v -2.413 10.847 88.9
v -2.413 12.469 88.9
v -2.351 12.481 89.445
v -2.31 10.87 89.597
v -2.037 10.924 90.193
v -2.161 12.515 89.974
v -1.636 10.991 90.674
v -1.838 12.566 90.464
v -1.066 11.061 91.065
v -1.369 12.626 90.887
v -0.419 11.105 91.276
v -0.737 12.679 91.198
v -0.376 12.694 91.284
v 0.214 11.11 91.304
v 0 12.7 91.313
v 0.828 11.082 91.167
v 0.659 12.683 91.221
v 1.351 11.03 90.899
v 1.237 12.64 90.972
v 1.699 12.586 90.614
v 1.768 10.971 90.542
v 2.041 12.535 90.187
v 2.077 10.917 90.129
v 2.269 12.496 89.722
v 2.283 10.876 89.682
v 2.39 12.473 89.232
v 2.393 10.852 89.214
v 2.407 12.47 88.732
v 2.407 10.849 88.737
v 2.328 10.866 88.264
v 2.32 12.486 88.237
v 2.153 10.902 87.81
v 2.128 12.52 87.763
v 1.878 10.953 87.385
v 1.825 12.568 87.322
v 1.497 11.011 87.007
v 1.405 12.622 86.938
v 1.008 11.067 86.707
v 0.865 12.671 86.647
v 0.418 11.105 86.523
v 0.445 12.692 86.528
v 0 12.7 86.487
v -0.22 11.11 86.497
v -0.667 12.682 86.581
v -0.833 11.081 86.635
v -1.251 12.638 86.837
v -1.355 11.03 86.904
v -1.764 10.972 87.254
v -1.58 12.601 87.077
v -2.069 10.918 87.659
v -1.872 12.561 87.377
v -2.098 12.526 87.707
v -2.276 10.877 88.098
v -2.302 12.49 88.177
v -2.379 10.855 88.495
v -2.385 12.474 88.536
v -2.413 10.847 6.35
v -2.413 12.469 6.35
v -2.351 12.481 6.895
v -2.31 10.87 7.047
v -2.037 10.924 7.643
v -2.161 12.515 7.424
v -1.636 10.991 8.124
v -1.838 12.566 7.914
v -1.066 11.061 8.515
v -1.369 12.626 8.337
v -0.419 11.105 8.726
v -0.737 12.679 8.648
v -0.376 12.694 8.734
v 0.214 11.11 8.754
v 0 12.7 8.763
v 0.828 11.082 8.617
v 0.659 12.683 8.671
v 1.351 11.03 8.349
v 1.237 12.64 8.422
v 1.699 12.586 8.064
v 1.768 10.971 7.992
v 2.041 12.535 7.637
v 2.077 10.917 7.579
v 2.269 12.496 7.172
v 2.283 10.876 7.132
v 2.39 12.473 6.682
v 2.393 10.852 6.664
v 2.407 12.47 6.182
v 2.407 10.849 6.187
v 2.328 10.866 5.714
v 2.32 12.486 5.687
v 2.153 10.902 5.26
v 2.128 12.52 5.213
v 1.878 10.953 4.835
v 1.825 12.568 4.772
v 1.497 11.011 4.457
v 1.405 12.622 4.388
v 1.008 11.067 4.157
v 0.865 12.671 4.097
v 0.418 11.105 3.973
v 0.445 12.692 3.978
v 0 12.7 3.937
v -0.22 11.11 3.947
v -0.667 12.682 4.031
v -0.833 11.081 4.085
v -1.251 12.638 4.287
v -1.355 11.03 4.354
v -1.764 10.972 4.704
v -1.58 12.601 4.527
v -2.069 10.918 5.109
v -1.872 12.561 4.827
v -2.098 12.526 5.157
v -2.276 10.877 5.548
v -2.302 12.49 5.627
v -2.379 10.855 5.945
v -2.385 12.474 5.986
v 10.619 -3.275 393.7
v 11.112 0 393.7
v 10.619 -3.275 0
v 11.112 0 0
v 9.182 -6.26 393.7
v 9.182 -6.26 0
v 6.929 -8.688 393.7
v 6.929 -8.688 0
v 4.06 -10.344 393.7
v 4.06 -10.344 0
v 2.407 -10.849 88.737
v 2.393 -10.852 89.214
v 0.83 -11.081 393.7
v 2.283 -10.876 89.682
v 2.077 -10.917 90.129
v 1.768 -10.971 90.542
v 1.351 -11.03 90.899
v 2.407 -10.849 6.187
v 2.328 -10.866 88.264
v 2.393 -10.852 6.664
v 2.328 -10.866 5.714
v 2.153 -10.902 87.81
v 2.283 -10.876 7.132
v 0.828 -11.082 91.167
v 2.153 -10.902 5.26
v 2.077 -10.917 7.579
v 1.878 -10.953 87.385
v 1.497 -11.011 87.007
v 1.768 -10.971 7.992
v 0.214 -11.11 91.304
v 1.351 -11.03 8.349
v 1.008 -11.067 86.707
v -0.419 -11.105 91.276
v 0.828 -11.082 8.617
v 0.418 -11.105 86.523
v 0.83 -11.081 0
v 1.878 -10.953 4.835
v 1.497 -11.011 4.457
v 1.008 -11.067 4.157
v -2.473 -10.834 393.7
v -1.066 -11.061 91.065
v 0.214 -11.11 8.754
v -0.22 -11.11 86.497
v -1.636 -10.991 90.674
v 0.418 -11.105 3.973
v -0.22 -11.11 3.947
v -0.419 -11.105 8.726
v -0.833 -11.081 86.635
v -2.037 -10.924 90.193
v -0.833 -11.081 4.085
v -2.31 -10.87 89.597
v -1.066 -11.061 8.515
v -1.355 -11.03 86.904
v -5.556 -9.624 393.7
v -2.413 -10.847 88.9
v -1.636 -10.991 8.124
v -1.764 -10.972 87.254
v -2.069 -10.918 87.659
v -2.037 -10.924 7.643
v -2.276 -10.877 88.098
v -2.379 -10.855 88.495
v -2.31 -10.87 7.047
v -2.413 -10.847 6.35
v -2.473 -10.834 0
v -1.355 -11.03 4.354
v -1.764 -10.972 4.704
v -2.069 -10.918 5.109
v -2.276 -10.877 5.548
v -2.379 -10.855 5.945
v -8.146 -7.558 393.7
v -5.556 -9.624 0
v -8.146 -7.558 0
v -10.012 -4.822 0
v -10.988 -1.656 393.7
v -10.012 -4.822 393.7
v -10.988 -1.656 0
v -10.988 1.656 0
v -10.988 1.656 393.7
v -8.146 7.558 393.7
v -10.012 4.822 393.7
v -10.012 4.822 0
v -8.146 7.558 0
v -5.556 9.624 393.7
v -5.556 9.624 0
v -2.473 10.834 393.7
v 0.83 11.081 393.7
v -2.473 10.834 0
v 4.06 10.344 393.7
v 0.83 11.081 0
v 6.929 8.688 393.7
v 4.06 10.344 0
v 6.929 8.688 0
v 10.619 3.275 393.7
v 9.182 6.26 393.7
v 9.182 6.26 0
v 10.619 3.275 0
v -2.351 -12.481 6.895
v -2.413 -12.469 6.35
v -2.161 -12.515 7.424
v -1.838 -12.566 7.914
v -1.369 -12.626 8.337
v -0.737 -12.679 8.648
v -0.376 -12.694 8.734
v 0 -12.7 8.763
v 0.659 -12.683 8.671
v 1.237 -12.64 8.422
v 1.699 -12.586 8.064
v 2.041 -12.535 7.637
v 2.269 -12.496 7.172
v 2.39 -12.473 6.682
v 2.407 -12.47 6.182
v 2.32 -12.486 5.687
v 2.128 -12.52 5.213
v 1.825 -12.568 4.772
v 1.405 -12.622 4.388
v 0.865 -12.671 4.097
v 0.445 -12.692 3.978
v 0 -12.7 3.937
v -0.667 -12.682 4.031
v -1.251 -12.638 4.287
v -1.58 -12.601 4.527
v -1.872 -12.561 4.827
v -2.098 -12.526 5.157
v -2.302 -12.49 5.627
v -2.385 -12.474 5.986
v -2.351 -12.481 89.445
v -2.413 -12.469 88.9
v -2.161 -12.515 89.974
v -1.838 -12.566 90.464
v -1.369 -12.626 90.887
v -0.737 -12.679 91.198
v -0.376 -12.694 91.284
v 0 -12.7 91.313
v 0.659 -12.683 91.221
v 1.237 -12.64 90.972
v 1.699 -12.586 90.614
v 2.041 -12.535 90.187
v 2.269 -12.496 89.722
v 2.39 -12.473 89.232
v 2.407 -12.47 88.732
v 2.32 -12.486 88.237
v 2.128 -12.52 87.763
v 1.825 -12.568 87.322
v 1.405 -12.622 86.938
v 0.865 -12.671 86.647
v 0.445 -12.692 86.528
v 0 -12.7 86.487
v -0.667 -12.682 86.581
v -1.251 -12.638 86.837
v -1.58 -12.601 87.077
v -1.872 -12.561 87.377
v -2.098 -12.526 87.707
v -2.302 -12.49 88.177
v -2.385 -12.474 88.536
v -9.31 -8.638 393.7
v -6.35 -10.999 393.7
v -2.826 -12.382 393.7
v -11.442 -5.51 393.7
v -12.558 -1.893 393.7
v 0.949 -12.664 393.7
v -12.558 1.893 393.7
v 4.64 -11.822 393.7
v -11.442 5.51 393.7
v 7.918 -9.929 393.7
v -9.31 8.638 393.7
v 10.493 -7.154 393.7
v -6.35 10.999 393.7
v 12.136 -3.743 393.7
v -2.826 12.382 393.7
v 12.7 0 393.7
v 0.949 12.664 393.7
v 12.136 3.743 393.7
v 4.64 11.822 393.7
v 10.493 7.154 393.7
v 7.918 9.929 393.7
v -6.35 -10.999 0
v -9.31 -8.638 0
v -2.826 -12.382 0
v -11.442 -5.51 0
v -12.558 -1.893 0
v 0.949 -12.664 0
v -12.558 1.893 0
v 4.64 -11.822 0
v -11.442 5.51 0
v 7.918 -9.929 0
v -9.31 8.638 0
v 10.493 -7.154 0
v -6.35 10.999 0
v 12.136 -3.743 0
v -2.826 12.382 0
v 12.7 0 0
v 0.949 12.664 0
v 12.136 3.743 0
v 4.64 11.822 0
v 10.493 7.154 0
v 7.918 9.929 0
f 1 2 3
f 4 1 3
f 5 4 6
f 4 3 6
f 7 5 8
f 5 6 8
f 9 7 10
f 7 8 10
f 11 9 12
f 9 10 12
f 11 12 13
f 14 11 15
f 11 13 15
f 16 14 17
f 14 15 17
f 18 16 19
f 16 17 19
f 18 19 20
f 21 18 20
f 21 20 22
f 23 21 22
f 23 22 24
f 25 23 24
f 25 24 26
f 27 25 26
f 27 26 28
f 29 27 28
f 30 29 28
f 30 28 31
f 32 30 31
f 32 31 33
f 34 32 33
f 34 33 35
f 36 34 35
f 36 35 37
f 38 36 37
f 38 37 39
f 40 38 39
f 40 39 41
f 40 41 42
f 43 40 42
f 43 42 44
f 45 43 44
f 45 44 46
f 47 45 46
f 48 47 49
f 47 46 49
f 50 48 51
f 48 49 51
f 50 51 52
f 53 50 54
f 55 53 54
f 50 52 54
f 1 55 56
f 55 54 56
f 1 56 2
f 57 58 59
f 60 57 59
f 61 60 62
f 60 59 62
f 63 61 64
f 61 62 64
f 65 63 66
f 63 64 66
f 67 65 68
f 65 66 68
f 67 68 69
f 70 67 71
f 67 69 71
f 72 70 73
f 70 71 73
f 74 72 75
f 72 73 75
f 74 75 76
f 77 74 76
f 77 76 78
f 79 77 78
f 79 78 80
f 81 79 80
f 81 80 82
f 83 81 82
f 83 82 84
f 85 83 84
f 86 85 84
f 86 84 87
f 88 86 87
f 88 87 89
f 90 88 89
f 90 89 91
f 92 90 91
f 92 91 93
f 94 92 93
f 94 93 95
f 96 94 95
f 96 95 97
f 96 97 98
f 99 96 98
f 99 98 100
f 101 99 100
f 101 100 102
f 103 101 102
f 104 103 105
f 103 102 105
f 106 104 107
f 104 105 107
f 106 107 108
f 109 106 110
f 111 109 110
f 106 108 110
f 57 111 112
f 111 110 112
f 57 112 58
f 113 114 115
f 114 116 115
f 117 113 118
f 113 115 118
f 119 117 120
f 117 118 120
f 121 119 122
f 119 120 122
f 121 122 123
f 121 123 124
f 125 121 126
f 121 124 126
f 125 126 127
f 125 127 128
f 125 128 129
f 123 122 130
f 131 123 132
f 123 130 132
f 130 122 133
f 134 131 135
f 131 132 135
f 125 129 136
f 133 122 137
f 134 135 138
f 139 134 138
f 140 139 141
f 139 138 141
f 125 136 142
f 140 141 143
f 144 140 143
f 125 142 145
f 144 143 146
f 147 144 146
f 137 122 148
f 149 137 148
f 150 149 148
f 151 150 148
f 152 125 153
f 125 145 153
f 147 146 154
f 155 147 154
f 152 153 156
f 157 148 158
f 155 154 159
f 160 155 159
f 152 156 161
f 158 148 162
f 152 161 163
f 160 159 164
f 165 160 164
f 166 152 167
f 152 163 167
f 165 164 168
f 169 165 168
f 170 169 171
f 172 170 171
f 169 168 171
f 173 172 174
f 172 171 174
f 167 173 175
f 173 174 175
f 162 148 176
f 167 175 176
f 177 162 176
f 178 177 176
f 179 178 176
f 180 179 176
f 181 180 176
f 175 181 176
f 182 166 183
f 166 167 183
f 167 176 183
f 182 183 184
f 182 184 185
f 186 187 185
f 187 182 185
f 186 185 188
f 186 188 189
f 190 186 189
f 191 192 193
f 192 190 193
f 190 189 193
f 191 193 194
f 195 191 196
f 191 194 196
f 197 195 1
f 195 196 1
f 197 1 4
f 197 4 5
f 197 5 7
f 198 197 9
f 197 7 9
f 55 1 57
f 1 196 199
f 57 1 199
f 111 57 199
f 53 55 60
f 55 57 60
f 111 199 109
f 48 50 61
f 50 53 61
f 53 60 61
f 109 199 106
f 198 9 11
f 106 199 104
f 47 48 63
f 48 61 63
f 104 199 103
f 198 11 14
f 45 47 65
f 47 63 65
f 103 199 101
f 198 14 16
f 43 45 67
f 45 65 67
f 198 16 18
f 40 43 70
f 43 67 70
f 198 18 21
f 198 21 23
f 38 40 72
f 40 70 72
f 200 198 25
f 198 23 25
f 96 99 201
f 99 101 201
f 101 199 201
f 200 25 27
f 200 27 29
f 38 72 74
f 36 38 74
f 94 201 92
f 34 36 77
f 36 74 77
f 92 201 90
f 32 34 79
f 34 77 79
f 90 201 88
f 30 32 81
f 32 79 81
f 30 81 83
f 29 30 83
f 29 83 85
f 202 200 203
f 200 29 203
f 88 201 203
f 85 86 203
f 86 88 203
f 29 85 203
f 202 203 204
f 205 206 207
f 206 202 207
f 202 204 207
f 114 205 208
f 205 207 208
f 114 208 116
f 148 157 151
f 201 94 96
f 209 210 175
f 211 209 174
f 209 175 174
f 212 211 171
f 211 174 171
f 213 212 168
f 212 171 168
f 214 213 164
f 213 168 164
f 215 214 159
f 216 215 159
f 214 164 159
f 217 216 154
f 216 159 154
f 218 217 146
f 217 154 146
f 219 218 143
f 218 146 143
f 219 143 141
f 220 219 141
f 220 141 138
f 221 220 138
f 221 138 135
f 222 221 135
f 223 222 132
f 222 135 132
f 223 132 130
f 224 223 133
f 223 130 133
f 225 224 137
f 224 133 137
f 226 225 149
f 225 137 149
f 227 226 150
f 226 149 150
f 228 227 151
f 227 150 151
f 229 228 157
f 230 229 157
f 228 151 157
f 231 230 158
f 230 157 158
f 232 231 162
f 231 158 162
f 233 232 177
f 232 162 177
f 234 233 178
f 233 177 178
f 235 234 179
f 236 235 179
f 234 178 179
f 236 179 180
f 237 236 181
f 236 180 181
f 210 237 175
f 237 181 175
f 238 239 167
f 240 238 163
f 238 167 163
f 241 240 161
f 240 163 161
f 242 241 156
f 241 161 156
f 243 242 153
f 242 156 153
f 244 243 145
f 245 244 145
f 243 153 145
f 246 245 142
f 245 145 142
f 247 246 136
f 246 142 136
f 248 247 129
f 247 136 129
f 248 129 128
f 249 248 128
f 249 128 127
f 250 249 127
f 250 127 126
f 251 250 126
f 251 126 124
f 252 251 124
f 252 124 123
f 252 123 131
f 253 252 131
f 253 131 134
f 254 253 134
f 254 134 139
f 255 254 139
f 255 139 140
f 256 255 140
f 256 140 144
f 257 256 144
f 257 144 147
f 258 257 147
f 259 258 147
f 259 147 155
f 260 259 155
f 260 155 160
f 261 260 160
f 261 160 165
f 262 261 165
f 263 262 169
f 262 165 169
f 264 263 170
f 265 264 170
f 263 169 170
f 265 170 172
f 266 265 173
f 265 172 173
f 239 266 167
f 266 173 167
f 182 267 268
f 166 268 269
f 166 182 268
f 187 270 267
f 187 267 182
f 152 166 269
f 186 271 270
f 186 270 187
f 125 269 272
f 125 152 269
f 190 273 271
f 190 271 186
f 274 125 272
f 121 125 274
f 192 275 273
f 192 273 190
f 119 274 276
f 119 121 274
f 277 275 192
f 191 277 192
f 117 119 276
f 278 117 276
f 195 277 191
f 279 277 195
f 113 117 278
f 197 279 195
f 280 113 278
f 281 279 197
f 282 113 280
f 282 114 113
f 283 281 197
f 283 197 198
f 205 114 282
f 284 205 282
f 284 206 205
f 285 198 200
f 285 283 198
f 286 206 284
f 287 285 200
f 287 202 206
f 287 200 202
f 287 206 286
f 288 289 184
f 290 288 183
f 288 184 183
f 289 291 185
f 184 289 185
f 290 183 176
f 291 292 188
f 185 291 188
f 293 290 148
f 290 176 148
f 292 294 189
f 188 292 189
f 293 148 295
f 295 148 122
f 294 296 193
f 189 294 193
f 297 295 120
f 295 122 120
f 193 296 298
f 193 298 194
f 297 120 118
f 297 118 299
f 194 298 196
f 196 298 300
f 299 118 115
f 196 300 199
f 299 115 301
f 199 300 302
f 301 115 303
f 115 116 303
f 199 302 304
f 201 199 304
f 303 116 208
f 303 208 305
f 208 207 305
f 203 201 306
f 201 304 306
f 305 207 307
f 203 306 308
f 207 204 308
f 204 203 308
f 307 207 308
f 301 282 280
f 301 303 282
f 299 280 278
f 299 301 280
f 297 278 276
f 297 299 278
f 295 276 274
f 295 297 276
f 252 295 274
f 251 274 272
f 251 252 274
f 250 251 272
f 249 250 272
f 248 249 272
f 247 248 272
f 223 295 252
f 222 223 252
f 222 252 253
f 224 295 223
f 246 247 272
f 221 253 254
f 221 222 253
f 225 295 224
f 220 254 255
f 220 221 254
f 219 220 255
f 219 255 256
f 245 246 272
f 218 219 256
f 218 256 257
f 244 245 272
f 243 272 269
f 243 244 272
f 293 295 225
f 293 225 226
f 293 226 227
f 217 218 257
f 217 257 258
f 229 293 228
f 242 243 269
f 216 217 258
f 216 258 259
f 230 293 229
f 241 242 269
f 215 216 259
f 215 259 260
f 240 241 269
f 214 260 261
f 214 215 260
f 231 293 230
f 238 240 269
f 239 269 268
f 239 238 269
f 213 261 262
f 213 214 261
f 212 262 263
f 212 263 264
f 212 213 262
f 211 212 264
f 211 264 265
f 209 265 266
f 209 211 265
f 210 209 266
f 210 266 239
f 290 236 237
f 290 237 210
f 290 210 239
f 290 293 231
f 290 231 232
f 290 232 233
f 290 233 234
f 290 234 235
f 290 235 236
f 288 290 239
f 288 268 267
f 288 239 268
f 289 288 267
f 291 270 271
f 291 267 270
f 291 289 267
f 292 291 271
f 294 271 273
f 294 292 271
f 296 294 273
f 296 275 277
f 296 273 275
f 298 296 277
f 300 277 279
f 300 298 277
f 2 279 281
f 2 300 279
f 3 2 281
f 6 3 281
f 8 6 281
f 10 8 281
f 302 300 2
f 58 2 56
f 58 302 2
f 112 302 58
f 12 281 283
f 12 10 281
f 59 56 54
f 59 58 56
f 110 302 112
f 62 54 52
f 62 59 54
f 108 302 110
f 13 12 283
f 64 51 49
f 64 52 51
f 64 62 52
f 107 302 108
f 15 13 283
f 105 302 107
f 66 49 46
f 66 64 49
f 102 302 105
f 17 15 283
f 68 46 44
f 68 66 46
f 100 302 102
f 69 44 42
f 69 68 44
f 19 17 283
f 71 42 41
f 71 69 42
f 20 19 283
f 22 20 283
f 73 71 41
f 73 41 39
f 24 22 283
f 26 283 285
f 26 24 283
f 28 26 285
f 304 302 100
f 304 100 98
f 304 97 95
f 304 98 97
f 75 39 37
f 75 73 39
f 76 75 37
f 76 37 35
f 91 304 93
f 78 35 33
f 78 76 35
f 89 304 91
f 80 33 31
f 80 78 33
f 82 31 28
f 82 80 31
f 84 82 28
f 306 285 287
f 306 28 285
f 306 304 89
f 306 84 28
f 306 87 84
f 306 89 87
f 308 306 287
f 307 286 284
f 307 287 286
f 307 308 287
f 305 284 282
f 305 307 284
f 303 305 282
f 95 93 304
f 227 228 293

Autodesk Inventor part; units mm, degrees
ref_plane "YZ Plane" through (0, 0, 0) normal (1, 0, 0) x (0, 1, 0)
ref_plane "XY Plane" through (0, 0, 0) normal (0, 0, 1) x (1, 0, 0)
sketch "Sketch1" plane through (0, 0, 0) normal (0, 0, 1) x (1, 0, 0)
  circle A0 centre (0, 0) radius 12.7
  circle A1 centre (0, 0) radius 11.1125
  dimension "d0" = 25.4
  dimension "d1" = 22.225
extrude "Extrusion1" add sketch "Sketch1" along normal blind 393.7
ref_plane "Work Plane1" through (0, 12.7, 0) normal (0, 1, 0) x (-1, 0, 0)
sketch "Sketch2" plane through (0, 12.7, 0) normal (0, 1, 0) x (-1, 0, 0)
  line L0 (-12.7, 0) -> (-12.7, 393.7) projected
  line L1 (-12.7, 0) -> (12.7, 0) projected
  line L2 (12.7, 0) -> (12.7, 393.7) projected
  circle A0 centre (0, 6.35) radius 2.413
  circle A1 centre (0, 88.9) radius 2.413
  line L3 (0, 0) -> (0, 58.059) construction
  dimension "d4" = 4.826
  dimension "d6" = 6.35
  dimension "d7" = 88.9
extrude "Extrusion2" cut sketch "Sketch2" against normal blind 25.4
properties part number "Polycarbonate Clamp Tube 1 in OD (8585K14)" material "Polycarbonate, Clear"
